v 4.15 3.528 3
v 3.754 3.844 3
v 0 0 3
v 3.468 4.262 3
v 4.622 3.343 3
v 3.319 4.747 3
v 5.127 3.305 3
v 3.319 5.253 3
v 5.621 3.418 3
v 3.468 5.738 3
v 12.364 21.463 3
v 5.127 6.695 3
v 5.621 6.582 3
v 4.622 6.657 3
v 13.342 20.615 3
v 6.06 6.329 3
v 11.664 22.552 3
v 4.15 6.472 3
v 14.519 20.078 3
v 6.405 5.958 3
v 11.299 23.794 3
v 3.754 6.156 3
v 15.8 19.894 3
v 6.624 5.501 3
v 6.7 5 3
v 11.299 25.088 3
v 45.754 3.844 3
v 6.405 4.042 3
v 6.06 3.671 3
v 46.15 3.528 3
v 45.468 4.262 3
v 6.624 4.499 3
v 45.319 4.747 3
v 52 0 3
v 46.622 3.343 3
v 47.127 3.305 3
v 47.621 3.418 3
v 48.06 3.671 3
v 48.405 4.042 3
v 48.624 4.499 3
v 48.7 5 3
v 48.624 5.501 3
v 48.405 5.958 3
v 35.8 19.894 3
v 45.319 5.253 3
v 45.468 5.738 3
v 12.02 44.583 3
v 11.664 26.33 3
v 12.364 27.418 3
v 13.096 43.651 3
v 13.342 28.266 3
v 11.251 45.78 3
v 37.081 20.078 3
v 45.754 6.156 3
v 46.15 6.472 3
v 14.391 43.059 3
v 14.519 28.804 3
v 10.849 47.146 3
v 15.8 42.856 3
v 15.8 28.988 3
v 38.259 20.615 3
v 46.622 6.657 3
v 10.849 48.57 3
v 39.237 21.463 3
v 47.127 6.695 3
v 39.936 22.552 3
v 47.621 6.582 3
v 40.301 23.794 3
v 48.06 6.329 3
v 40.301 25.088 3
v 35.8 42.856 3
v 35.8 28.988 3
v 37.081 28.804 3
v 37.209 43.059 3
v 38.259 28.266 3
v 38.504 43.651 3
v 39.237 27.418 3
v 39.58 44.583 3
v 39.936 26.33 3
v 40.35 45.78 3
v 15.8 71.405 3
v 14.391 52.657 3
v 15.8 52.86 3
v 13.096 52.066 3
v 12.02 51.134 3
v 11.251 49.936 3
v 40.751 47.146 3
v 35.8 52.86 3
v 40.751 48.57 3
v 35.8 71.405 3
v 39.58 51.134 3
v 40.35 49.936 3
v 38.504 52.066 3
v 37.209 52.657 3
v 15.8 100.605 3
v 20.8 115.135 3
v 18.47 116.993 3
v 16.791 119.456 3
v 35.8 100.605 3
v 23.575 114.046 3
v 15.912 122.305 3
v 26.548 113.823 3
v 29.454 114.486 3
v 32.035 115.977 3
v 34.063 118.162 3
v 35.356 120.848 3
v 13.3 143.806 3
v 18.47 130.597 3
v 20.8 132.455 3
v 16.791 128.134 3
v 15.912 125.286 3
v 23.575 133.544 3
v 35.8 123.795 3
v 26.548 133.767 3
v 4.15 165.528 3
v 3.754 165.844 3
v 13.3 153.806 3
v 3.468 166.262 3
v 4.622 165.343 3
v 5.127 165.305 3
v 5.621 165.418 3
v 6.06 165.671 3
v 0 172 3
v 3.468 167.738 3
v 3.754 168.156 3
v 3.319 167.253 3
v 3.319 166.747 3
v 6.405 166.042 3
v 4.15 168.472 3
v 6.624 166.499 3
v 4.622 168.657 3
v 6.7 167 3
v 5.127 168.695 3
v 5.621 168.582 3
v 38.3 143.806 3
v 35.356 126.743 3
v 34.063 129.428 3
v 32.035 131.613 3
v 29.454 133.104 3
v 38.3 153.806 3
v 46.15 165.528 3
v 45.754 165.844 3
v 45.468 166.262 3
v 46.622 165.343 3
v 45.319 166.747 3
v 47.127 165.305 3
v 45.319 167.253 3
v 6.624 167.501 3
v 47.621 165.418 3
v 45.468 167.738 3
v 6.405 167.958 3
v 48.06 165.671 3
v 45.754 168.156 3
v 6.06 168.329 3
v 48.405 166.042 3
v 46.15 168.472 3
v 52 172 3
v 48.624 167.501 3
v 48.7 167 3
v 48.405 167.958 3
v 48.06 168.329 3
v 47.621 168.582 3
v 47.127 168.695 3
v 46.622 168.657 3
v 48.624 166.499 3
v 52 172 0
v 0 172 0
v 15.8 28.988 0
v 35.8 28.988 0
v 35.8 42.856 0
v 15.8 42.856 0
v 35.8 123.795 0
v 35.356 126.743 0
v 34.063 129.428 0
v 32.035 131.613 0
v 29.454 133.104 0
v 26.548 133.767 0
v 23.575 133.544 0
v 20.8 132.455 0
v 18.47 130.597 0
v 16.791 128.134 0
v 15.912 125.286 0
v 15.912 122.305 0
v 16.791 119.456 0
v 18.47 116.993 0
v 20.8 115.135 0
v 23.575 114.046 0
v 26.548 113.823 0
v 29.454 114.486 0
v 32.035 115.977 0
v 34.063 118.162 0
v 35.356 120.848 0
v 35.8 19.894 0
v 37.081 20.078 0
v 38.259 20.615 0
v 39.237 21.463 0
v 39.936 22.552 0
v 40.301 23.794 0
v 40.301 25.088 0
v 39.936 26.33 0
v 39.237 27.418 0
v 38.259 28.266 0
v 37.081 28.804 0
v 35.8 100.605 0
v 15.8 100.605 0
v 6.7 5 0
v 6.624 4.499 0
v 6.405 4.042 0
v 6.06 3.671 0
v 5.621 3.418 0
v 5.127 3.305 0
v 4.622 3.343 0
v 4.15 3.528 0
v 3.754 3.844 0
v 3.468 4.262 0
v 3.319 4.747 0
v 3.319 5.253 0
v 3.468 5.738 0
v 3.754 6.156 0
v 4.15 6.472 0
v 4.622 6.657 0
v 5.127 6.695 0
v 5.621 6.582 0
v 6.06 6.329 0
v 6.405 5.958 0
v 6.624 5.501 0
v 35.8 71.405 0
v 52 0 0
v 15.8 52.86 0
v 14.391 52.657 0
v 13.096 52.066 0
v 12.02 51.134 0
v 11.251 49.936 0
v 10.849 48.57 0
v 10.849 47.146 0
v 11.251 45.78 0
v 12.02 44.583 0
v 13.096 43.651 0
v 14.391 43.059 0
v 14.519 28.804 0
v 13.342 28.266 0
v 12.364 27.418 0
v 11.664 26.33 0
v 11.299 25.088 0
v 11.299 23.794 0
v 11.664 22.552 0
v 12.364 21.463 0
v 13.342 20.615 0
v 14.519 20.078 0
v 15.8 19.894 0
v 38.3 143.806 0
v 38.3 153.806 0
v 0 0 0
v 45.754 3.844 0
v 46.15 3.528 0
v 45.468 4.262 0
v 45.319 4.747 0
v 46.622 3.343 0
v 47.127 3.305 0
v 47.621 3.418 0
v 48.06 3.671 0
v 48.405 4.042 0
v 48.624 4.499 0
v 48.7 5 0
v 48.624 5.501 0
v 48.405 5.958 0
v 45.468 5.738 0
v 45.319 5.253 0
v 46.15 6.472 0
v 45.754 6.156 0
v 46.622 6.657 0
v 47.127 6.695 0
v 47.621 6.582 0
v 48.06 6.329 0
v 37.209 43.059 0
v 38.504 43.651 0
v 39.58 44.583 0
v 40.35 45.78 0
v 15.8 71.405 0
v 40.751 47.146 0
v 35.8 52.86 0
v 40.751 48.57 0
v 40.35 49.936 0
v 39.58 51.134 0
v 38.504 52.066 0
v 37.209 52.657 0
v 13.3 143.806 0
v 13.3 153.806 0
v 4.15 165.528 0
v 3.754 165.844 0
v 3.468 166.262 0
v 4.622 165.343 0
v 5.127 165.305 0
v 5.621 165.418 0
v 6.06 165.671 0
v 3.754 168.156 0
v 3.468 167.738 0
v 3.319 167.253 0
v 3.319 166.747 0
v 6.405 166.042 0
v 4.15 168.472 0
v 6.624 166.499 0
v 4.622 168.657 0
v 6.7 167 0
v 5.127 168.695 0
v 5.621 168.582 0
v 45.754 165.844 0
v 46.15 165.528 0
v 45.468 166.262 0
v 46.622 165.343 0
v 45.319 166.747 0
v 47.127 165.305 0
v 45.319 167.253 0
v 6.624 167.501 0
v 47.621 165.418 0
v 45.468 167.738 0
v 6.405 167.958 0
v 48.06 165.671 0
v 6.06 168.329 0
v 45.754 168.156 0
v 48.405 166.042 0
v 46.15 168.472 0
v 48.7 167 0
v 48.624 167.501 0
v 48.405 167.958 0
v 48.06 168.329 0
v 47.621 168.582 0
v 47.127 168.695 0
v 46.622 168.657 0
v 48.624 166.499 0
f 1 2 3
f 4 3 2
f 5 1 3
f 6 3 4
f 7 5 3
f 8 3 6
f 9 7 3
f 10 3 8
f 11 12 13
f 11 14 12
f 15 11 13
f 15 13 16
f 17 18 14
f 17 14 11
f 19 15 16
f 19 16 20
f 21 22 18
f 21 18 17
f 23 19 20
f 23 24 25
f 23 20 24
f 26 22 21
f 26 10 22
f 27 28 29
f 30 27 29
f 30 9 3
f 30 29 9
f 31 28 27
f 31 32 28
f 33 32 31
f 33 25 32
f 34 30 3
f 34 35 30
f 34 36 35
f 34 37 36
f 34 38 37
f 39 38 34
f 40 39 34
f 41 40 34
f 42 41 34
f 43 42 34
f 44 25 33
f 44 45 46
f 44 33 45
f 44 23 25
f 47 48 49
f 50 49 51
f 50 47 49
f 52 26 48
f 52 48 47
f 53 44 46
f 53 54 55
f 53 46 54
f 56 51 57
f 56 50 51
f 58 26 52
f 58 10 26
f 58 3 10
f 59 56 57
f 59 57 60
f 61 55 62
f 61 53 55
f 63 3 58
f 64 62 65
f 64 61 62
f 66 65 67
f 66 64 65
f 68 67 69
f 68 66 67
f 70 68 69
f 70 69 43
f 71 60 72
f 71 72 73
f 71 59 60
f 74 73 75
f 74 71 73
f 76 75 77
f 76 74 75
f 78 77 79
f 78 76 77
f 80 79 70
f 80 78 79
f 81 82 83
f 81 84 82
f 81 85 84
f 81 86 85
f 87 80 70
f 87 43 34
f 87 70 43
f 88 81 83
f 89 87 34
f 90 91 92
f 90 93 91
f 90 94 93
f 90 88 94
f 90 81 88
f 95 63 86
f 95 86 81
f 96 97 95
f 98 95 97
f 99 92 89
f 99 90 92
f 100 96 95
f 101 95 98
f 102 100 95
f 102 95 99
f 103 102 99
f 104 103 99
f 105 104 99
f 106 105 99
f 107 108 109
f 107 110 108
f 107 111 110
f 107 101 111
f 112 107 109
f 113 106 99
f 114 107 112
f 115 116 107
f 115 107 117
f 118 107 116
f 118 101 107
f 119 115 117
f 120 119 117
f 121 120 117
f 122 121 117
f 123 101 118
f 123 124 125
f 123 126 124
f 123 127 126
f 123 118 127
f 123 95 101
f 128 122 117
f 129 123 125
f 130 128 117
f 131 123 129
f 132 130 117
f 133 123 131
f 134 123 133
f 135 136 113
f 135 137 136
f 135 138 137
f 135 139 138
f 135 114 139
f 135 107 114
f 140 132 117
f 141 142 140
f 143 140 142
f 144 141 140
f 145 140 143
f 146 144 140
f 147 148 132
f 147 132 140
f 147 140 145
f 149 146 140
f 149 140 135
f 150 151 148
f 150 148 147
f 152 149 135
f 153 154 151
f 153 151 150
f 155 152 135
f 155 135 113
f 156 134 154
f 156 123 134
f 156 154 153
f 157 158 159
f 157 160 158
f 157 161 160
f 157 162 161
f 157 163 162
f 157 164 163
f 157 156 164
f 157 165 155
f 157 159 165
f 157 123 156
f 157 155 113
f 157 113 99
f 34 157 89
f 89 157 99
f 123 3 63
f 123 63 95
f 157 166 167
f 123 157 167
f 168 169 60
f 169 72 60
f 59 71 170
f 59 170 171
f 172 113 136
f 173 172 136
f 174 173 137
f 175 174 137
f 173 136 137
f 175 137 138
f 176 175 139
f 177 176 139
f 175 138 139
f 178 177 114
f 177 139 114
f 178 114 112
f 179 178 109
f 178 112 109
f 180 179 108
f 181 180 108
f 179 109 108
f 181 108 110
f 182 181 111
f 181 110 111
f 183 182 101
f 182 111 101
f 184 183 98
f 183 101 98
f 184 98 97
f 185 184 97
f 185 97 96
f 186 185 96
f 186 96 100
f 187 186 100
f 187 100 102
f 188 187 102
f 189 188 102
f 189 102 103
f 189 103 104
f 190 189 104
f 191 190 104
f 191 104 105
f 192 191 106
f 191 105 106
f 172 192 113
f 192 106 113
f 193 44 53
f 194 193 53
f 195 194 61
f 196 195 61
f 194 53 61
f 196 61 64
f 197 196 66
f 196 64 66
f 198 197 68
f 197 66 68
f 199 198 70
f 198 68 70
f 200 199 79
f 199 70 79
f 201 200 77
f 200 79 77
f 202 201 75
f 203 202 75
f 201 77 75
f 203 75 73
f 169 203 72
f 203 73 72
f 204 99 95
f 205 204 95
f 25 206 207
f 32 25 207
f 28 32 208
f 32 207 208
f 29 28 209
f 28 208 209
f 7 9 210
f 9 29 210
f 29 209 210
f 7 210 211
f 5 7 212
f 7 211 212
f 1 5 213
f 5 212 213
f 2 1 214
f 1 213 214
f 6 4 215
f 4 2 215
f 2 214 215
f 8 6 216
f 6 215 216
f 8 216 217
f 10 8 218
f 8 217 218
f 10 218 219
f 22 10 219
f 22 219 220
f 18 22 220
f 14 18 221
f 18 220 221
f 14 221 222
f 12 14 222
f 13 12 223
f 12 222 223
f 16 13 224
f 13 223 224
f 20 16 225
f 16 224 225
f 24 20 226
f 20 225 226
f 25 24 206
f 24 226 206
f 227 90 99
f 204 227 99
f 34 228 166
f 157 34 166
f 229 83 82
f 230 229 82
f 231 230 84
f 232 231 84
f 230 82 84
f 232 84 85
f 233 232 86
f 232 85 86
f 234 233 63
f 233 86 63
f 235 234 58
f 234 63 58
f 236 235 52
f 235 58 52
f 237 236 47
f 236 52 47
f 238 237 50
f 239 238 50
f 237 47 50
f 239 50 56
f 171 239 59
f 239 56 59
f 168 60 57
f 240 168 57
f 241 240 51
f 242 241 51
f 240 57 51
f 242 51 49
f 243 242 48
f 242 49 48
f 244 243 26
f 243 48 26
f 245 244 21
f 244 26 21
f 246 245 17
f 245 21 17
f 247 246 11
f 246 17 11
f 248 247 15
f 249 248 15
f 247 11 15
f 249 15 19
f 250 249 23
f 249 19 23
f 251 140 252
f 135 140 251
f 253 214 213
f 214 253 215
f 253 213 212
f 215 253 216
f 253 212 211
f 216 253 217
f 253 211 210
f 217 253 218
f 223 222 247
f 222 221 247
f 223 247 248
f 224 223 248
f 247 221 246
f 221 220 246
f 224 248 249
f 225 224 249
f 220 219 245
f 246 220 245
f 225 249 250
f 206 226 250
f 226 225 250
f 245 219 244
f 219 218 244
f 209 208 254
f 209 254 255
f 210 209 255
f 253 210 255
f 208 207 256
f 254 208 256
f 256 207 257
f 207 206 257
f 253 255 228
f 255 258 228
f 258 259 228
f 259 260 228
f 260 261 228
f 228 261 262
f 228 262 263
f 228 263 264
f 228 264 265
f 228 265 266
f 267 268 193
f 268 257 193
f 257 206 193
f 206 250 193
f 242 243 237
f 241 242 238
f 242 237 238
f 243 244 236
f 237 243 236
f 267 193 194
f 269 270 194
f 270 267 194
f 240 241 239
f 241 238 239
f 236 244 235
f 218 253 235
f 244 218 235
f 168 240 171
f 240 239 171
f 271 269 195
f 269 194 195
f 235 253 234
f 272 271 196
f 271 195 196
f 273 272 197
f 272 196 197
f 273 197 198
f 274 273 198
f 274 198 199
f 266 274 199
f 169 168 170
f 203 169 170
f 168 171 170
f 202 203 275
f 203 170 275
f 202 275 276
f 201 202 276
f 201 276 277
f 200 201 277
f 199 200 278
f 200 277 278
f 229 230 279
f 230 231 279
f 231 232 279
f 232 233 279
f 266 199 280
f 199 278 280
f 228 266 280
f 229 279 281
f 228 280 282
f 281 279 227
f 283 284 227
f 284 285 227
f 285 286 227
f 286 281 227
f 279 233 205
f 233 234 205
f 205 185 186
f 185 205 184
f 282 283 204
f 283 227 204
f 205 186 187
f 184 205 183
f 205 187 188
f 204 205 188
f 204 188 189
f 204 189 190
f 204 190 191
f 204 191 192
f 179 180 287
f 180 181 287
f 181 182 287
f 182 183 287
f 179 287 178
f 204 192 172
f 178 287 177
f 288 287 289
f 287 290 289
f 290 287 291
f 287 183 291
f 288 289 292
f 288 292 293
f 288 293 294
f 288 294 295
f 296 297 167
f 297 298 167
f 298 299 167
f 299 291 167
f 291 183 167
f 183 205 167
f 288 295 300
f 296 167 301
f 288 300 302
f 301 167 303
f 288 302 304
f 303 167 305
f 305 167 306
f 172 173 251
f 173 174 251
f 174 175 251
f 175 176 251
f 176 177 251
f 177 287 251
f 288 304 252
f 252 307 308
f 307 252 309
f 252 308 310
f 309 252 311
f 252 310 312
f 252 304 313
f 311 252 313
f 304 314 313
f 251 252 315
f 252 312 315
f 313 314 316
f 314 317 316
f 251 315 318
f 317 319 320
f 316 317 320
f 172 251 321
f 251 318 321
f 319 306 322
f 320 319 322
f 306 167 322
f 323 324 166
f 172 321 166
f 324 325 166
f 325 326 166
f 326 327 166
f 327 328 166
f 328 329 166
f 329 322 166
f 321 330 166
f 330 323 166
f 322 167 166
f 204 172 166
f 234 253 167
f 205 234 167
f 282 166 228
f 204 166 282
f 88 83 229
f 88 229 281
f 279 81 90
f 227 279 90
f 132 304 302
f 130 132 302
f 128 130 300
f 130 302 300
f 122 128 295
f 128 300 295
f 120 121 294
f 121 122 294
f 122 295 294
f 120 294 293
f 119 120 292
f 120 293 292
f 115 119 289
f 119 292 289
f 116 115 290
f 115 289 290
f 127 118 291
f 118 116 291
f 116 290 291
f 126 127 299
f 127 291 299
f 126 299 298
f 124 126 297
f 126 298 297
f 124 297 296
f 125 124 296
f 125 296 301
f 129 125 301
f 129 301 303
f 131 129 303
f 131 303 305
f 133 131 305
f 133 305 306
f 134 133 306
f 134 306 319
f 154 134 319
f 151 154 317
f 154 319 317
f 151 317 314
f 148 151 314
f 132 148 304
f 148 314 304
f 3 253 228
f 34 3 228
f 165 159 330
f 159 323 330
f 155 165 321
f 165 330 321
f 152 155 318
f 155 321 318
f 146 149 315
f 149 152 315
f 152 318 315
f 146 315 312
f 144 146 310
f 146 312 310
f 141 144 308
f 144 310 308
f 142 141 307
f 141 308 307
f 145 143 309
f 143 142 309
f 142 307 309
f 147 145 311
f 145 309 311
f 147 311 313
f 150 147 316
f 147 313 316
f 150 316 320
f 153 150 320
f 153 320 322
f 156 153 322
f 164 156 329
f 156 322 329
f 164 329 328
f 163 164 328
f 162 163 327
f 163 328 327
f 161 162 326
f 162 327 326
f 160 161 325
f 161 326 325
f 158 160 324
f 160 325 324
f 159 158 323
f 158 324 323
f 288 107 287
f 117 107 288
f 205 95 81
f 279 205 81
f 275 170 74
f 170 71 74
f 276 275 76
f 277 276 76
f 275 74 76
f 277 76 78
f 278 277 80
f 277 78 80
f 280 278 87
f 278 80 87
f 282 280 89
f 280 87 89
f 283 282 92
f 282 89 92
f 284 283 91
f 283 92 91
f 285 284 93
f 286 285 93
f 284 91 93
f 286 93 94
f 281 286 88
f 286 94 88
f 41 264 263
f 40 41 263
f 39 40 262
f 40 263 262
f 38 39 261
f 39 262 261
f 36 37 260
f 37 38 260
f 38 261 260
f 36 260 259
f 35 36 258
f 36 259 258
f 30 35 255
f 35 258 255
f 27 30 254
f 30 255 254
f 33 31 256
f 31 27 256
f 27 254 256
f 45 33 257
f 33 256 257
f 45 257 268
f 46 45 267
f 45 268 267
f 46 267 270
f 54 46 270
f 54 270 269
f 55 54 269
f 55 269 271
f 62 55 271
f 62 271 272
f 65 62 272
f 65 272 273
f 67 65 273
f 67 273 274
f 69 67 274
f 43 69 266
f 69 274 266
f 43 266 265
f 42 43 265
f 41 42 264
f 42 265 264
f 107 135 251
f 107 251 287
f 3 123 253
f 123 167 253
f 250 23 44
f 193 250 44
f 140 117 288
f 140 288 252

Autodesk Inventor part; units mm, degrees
ref_plane "YZ Plane" through (0, 0, 0) normal (1, 0, 0) x (0, 1, 0)
ref_plane "XZ Plane" through (0, 0, 0) normal (0, 1, 0) x (-1, 0, 0)
ref_plane "XY Plane" through (0, 0, 0) normal (0, 0, 1) x (1, 0, 0)
sketch "Sketch1" plane through (0, 0, 0) normal (0, 0, 1) x (1, 0, 0)
  line L0 (0, 0) -> (52, 0)
  line L1 (52, 0) -> (52, 172)
  line L2 (52, 172) -> (0, 172)
  line L3 (0, 172) -> (0, 0)
  line L4 (0, 0) -> (10, 0)
  line L5 (10, 0) -> (10, 10)
  line L6 (10, 10) -> (0, 10)
  line L7 (0, 10) -> (0, 0)
  circle A0 centre (5, 5) radius 1.7
  line L8 (52, 0) -> (42, 0)
  line L9 (42, 0) -> (42, 10)
  line L10 (42, 10) -> (52, 10)
  line L11 (52, 10) -> (52, 0)
  circle A1 centre (47, 5) radius 1.7
  line L12 (52, 86) -> (47, 86)
  line L13 (0, 172) -> (10, 172)
  line L14 (10, 172) -> (10, 162)
  line L15 (10, 162) -> (0, 162)
  line L16 (0, 162) -> (0, 172)
  circle A2 centre (5, 167) radius 1.7
  line L17 (52, 172) -> (42, 172)
  line L18 (42, 172) -> (42, 162)
  line L19 (42, 162) -> (52, 162)
  line L20 (52, 162) -> (52, 172)
  circle A3 centre (47, 167) radius 1.7
  dimension "d0" = 52
  dimension "d1" = 172
  dimension "d2" = 10
  dimension "d3" = 10
  dimension "d4" = 3.4
extrude "Extrusion1" add sketch "Sketch1" along normal blind 3
sketch "Sketch2" plane through (0, 0, 3) normal (0, 0, 1) x (1, 0, 0)
  circle A0 centre (5, 167) radius 1.7 projected
  circle A1 centre (47, 5) radius 1.7 projected
  line L0 (5, 167) -> (47, 167)
  line L1 (47, 167) -> (47, 5)
  line L2 (47, 5) -> (5, 5)
  line L3 (5, 5) -> (5, 167)
  line L4 (13.3003, 153.806) -> (38.3003, 153.806)
  line L5 (38.3003, 153.806) -> (38.3003, 143.806)
  line L6 (38.3003, 143.806) -> (13.3003, 143.806)
  line L7 (13.3003, 143.806) -> (13.3003, 153.806)
  circle A2 centre (25.8003, 123.7951) radius 10
  line L8 (35.8003, 86) -> (35.8003, 100.6048)
  line L9 (35.8003, 100.6048) -> (26, 100.6048)
  line L10 (35.8003, 100.6048) -> (15.8003, 100.6048)
  line L11 (15.8003, 100.6048) -> (15.8003, 71.4048)
  line L12 (15.8003, 71.4048) -> (35.8003, 71.4048)
  line L13 (35.8003, 71.4048) -> (35.8003, 100.6048)
  line L14 (15.8003, 47.8583) -> (35.8003, 47.8583) construction
  line L15 (15.8003, 52.8601) -> (35.8003, 52.8601)
  line L16 (35.8003, 42.8565) -> (15.8003, 42.8565)
  arc A3 (15.8003, 52.8601) -> (15.8003, 42.8565) centre (15.8003, 47.8583) ccw
  arc A4 (35.8003, 42.8565) -> (35.8003, 52.8601) centre (35.8003, 47.8583) ccw
  line L17 (15.8003, 24.4407) -> (35.8003, 24.4407) construction
  line L18 (15.8003, 19.8936) -> (35.8003, 19.8936)
  line L19 (35.8003, 28.9878) -> (15.8003, 28.9878)
  arc A5 (15.8003, 28.9878) -> (15.8003, 19.8936) centre (15.8003, 24.4407) ccw
  arc A6 (35.8003, 19.8936) -> (35.8003, 28.9878) centre (35.8003, 24.4407) ccw
  point P0 (0, 0)
  point P1 (25.8003, 47.8583)
  point P2 (25.8003, 24.4407)
  dimension "d7" = 25
  dimension "d8" = 10
  dimension "d9" = 20
  dimension "d10" = 29.2
extrude "Extrusion2" cut sketch "Sketch2" against normal blind 3 contours L4 L5 L6 L7 | A2 | L13 L12 L11 L10 L9 L8 | L15 A4 L16 A3 | A5 L19 A6 L18
properties part number "port plugin"
